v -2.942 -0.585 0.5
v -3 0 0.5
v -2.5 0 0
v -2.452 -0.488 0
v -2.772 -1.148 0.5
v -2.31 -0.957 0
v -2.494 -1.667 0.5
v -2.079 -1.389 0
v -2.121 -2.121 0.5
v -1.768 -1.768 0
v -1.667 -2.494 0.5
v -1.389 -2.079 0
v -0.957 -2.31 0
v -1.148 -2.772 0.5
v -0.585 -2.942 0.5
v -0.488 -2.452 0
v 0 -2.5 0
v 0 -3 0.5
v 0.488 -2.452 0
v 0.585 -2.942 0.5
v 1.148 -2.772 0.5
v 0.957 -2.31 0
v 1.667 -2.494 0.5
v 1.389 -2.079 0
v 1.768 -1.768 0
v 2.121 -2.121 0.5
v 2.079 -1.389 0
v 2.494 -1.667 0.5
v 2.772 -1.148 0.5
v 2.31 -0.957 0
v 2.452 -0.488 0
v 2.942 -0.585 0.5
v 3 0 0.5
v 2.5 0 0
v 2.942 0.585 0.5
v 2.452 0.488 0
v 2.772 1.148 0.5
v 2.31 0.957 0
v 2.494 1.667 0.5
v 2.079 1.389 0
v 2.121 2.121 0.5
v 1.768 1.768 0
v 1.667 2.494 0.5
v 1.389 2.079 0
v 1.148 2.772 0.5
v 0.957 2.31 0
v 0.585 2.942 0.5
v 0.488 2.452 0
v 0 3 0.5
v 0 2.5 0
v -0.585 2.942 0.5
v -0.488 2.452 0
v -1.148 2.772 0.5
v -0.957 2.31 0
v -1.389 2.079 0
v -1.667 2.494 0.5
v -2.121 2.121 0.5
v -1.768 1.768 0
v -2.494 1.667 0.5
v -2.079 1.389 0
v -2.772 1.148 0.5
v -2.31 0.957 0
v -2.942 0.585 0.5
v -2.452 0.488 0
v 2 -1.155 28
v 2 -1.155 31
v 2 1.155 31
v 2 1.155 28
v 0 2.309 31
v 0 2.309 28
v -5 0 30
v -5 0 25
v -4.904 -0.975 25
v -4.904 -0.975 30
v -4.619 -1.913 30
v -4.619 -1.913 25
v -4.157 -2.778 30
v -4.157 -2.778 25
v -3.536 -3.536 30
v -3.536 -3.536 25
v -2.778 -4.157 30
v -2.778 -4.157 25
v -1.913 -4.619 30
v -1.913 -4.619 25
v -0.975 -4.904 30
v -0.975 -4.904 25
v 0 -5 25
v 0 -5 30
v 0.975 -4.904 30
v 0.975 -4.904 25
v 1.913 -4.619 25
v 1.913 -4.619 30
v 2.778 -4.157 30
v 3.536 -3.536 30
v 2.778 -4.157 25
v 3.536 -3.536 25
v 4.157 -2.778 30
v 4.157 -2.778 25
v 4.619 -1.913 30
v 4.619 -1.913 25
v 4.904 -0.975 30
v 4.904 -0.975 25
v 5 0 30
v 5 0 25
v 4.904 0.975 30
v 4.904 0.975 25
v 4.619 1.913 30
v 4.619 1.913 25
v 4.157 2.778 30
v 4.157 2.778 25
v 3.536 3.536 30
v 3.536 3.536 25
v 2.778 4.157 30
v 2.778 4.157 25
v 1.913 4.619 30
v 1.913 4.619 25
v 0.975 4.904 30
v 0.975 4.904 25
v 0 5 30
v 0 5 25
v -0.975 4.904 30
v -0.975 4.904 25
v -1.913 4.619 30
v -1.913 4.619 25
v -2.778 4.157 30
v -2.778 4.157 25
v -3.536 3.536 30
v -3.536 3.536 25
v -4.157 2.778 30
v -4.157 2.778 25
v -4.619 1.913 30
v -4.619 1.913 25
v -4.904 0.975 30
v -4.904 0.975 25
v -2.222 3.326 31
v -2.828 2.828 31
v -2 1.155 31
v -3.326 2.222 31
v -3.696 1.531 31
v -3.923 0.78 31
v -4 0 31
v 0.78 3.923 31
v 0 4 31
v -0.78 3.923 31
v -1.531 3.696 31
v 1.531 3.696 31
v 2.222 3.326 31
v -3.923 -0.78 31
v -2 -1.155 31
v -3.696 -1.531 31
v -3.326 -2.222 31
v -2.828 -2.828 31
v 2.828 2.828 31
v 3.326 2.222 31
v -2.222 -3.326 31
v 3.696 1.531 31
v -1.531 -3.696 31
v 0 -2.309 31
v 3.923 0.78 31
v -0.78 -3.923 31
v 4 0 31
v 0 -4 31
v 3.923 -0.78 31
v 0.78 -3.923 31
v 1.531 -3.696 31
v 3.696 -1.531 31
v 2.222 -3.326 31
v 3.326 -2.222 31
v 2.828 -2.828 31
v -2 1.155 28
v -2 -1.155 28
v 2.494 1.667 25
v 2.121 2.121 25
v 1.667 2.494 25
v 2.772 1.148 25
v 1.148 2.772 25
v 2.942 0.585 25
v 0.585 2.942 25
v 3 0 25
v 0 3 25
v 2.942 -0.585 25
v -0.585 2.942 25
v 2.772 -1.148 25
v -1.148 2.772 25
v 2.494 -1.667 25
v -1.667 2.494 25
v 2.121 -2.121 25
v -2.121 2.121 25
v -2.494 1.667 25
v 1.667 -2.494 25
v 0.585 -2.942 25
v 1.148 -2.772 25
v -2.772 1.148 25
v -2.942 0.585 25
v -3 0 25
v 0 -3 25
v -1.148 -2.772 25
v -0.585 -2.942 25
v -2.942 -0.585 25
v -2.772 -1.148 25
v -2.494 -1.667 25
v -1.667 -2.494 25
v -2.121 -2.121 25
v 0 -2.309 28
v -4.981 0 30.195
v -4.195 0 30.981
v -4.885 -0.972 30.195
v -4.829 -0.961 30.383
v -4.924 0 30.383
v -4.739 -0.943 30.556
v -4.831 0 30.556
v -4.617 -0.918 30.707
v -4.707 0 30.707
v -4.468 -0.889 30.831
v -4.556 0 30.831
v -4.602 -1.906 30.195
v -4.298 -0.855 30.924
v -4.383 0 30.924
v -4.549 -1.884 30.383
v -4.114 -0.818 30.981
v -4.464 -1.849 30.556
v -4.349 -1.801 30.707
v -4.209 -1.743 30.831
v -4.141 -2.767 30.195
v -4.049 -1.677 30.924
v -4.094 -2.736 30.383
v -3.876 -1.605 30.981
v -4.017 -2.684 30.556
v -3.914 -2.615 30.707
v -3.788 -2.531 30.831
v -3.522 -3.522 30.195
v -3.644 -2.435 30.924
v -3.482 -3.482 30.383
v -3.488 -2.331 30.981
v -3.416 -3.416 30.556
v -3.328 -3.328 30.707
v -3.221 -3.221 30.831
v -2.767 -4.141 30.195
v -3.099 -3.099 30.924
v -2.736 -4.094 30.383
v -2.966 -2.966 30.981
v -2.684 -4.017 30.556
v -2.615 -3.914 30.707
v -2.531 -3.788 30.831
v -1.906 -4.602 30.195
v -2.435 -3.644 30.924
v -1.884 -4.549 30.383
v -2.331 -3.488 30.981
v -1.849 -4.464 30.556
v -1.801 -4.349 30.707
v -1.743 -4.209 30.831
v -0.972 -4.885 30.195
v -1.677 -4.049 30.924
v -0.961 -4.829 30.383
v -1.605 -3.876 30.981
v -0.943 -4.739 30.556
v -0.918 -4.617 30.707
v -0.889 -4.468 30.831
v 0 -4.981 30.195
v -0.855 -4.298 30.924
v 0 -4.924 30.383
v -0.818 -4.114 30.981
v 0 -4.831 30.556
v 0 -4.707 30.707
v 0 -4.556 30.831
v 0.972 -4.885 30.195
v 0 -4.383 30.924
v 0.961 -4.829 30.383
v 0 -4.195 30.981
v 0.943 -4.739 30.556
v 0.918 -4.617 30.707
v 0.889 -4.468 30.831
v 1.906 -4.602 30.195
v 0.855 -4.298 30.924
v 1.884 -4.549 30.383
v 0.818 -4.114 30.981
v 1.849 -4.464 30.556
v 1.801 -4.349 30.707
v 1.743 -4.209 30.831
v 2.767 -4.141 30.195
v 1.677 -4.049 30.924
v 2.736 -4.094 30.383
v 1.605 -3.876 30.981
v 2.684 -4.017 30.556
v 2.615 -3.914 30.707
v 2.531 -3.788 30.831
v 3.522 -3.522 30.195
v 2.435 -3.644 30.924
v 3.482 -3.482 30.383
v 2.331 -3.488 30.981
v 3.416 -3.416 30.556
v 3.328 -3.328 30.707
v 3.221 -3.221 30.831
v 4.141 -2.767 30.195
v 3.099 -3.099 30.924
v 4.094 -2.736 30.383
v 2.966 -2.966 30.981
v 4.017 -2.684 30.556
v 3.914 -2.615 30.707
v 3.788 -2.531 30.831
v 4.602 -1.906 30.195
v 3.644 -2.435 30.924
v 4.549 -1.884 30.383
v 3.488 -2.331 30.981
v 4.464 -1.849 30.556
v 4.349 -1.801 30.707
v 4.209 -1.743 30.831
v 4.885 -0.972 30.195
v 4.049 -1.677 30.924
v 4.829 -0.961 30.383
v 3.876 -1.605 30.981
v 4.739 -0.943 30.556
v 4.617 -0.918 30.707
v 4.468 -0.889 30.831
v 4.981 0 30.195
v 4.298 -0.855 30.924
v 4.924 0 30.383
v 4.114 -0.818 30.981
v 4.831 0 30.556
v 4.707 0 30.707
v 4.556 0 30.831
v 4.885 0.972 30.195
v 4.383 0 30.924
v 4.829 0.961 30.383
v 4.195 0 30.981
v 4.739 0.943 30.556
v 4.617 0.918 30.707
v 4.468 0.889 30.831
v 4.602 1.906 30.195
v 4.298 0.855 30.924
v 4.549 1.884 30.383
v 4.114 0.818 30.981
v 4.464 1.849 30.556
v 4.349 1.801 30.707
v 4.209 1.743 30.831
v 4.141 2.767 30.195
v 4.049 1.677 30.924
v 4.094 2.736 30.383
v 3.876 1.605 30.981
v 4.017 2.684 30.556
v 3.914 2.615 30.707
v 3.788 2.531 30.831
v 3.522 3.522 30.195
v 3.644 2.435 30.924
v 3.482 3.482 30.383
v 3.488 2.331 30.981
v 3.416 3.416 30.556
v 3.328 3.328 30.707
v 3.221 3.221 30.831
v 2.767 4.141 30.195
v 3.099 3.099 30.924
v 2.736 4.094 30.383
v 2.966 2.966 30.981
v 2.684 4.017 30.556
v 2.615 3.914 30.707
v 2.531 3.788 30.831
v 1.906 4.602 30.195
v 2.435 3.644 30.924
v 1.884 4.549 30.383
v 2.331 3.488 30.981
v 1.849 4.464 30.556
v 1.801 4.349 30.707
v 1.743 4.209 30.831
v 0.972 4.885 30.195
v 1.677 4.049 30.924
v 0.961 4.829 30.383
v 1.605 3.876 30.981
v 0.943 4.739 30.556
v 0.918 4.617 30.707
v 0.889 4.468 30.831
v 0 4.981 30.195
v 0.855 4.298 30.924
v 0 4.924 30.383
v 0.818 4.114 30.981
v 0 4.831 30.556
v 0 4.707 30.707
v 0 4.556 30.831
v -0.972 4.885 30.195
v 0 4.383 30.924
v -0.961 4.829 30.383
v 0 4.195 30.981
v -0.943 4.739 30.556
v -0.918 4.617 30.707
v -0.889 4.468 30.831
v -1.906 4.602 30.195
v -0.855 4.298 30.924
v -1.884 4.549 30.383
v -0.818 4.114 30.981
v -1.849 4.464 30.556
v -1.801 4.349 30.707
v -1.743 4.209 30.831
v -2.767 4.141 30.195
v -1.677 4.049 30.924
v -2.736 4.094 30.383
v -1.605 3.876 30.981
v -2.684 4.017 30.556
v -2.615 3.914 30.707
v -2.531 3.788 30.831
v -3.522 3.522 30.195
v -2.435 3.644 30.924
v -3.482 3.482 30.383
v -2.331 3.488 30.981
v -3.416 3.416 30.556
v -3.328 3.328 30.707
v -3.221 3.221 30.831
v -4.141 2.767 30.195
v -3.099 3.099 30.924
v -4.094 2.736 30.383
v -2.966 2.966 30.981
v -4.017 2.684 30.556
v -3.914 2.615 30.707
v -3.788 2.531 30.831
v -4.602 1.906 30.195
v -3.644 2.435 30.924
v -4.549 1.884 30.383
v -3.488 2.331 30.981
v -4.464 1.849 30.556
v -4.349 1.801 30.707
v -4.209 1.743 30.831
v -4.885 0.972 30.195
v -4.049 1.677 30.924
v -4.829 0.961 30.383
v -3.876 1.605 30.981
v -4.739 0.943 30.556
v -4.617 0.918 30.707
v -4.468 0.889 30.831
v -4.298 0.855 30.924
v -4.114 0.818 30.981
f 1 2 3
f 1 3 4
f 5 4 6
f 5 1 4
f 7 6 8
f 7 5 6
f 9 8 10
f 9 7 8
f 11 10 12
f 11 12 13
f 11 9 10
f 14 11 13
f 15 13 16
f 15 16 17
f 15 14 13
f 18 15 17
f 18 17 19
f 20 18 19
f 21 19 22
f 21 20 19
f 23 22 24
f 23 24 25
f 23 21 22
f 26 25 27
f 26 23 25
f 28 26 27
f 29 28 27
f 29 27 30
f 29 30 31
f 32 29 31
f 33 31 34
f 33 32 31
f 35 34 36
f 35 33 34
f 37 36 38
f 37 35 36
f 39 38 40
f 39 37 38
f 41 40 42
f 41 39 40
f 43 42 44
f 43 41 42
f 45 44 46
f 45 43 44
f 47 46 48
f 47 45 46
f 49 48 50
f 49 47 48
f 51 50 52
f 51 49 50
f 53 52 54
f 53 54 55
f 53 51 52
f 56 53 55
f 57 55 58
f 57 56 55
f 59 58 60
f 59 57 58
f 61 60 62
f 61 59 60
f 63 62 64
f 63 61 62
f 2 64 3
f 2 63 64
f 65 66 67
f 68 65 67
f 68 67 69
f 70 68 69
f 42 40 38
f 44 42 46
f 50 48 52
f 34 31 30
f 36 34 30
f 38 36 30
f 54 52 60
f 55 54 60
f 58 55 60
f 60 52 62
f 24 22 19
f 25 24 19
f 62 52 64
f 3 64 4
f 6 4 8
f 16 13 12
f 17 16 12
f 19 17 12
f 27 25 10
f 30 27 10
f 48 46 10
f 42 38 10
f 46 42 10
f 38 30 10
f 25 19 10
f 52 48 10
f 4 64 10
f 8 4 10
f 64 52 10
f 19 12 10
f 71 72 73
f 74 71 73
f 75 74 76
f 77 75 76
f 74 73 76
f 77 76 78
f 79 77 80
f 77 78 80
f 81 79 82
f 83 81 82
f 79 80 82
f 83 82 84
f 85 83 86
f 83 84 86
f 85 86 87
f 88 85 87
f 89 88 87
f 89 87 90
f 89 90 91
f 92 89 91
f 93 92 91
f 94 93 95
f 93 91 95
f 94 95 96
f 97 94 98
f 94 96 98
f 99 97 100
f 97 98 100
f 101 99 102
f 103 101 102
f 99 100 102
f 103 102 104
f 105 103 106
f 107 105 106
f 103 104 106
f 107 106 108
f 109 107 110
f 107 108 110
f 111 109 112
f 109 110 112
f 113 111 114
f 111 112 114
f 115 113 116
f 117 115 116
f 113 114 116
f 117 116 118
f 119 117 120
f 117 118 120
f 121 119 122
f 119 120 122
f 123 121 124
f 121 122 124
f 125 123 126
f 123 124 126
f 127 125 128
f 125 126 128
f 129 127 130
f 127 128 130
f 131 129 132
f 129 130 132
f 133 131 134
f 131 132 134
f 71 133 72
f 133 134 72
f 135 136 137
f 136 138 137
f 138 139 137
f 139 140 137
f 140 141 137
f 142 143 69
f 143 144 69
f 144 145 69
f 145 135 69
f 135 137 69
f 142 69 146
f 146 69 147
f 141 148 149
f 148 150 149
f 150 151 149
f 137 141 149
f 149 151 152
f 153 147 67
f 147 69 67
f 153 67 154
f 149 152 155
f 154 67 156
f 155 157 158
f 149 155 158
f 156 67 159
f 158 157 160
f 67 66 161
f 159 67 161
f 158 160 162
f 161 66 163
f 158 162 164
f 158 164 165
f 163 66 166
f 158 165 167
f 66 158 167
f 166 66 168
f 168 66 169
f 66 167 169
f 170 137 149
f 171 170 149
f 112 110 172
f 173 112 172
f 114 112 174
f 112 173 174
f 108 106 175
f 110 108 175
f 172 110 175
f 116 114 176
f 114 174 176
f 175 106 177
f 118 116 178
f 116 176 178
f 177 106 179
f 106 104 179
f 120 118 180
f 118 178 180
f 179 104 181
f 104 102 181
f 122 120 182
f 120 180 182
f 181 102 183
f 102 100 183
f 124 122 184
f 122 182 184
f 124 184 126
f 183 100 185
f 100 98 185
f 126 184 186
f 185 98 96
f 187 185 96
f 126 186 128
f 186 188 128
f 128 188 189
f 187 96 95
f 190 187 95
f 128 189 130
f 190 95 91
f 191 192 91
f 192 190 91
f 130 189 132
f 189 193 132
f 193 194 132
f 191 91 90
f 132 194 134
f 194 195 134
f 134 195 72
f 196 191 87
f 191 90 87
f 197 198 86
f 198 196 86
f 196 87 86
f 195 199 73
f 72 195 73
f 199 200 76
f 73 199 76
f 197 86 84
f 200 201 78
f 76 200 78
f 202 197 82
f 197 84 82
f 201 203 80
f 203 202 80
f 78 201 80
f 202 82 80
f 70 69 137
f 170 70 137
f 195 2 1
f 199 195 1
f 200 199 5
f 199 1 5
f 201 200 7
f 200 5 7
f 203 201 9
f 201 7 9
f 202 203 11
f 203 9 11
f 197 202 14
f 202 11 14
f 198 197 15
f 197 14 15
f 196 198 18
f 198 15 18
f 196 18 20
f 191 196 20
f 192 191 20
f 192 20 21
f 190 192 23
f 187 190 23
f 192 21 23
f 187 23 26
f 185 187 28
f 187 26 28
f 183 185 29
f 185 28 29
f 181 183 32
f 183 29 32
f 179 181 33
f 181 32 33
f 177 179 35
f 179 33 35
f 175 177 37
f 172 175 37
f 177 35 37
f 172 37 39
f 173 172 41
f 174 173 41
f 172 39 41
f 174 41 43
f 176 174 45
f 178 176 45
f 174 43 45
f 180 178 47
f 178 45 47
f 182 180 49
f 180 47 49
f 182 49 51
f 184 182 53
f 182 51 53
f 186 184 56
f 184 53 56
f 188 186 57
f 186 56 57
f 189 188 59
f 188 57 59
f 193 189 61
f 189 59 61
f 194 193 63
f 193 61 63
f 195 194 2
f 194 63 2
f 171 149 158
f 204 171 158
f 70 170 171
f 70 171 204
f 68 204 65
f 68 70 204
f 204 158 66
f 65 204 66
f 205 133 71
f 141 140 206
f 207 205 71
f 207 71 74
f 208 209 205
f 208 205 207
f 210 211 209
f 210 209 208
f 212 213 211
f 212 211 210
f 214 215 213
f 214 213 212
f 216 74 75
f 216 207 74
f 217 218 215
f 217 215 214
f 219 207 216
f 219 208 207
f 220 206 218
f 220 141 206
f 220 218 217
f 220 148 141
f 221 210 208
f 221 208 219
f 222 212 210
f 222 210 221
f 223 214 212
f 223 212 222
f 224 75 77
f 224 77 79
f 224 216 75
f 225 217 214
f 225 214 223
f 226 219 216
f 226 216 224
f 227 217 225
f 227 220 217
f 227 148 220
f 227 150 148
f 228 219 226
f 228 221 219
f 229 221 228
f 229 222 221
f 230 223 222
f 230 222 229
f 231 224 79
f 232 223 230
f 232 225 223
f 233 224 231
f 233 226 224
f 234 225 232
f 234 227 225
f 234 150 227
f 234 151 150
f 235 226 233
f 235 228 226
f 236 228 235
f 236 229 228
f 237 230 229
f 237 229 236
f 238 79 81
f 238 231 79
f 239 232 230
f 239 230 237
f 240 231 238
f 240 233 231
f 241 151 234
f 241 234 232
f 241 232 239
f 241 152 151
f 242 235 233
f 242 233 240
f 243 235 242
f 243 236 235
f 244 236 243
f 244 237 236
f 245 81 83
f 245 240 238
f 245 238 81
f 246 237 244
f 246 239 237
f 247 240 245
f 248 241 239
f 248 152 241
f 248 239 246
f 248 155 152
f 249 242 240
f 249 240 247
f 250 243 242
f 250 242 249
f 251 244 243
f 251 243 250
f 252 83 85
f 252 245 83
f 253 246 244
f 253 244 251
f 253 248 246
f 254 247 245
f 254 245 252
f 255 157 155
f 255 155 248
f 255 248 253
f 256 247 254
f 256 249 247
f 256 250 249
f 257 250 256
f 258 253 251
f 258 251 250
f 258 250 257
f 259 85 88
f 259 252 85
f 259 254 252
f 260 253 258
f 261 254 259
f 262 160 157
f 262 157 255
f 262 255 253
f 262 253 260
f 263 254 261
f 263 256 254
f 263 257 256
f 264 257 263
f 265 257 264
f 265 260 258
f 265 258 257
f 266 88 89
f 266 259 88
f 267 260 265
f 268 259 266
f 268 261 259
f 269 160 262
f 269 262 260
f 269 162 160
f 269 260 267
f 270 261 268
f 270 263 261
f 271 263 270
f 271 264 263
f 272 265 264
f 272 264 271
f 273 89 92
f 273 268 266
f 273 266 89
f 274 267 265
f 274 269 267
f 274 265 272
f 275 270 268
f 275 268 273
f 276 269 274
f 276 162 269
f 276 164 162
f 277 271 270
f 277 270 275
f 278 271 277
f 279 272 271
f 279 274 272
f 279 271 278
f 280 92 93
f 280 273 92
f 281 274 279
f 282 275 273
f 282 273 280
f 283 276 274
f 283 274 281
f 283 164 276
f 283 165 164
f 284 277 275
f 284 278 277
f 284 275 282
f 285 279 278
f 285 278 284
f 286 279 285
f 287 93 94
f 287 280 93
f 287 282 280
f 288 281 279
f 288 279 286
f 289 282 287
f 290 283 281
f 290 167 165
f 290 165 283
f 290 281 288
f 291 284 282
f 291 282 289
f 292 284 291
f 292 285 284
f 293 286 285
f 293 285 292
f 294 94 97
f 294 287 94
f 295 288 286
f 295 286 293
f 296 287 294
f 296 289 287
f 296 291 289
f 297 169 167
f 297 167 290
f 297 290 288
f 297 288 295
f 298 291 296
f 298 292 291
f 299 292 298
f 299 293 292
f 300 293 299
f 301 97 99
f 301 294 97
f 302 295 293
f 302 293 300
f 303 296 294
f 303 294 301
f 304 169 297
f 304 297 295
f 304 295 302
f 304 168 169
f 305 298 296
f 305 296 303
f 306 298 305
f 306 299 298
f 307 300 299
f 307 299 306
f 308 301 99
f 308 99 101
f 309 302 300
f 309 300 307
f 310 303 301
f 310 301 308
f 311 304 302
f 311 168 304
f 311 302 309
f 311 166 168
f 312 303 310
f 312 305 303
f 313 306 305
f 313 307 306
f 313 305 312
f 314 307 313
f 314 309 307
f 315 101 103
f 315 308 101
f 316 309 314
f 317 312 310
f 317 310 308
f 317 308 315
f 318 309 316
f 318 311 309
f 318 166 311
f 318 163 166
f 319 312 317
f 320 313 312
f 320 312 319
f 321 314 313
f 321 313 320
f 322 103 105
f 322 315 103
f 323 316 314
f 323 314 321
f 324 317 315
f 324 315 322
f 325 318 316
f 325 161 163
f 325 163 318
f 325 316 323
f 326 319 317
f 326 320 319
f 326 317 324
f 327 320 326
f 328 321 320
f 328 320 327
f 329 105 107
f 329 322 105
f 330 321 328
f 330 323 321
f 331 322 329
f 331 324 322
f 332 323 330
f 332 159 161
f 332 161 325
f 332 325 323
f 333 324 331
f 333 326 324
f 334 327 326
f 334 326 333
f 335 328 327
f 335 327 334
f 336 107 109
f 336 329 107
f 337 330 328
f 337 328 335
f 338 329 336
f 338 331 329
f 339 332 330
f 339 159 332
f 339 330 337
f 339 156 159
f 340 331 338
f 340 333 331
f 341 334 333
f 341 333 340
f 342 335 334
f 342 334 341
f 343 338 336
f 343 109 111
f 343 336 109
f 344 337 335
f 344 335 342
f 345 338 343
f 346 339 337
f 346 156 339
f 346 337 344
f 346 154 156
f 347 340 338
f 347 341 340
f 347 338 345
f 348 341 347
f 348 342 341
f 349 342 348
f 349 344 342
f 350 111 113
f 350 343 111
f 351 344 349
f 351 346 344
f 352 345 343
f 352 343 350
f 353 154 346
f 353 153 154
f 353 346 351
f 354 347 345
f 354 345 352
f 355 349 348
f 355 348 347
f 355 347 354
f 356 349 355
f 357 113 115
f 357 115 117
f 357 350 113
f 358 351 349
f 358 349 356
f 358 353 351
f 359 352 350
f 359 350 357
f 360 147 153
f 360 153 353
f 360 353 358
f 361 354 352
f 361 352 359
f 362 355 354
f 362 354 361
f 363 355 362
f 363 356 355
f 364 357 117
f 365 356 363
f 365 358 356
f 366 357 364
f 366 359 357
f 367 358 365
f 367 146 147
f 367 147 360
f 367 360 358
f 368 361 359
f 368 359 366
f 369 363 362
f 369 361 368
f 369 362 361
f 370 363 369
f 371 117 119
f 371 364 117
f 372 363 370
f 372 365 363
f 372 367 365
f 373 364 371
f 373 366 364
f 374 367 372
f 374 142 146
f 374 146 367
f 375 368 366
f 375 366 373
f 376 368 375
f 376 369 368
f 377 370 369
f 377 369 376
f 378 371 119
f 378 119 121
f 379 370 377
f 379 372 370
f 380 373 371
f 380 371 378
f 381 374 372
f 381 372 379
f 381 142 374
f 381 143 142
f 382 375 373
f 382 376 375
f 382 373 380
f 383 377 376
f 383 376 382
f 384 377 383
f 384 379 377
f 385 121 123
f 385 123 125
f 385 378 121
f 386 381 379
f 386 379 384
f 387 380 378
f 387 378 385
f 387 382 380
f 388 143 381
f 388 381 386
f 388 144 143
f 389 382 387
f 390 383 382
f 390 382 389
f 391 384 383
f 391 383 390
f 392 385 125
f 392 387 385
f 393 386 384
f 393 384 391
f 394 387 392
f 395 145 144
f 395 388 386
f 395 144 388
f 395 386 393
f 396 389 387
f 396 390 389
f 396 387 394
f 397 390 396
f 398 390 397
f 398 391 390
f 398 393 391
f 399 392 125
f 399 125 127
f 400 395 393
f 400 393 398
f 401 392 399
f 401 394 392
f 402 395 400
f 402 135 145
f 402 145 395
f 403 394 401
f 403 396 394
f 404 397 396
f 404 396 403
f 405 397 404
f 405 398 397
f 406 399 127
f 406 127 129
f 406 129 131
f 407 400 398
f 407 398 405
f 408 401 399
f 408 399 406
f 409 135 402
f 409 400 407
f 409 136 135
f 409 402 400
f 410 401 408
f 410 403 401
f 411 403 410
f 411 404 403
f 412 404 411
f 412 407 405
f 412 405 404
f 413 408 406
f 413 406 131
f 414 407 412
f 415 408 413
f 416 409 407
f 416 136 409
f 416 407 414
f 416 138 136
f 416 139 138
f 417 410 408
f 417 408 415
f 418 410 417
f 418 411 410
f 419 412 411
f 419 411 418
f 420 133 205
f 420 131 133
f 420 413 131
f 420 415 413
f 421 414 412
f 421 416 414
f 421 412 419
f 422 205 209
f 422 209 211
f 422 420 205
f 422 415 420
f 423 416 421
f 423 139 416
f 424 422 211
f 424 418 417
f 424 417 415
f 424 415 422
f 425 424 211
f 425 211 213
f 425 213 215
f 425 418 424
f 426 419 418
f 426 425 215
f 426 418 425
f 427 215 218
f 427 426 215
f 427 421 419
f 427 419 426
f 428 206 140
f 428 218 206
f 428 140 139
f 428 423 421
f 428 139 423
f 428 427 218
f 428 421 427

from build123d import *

# Parameters (mm, degrees)
F2_SIZE  = 0.5
F3_R     = 1
F5_DEPTH = 3


with BuildPart() as f1:
    # F0 (on Front) → F1 (revolve)
    with BuildSketch(Plane.XZ):
        Polygon((-3, 0), (0, 0), (0, 31), (-5, 31), (-5, 25), (-3, 25), align=None)
    revolve(axis=Axis((0, 0, 15.604191), (0, 0, 1)))

    # F2
    f2_edges = [f1.edges().sort_by_distance(p)[0] for p in [
        (3, 0, 0),
    ]]
    chamfer(f2_edges, length=F2_SIZE)

    # F3
    f3_edges = [f1.edges().sort_by_distance(p)[0] for p in [
        (5, 0, 31),
    ]]
    fillet(f3_edges, radius=F3_R)

    # F4 (on face) → F5 (cut)
    with BuildSketch(Plane.XY.offset(31)):
        Polygon((-2, 1.154701), (-2, -1.154701), (0, -2.309401), (2, -1.154701), (2, 1.154701), (0, 2.309401), align=None)
    extrude(amount=-F5_DEPTH, mode=Mode.SUBTRACT)


solid = f1.part
